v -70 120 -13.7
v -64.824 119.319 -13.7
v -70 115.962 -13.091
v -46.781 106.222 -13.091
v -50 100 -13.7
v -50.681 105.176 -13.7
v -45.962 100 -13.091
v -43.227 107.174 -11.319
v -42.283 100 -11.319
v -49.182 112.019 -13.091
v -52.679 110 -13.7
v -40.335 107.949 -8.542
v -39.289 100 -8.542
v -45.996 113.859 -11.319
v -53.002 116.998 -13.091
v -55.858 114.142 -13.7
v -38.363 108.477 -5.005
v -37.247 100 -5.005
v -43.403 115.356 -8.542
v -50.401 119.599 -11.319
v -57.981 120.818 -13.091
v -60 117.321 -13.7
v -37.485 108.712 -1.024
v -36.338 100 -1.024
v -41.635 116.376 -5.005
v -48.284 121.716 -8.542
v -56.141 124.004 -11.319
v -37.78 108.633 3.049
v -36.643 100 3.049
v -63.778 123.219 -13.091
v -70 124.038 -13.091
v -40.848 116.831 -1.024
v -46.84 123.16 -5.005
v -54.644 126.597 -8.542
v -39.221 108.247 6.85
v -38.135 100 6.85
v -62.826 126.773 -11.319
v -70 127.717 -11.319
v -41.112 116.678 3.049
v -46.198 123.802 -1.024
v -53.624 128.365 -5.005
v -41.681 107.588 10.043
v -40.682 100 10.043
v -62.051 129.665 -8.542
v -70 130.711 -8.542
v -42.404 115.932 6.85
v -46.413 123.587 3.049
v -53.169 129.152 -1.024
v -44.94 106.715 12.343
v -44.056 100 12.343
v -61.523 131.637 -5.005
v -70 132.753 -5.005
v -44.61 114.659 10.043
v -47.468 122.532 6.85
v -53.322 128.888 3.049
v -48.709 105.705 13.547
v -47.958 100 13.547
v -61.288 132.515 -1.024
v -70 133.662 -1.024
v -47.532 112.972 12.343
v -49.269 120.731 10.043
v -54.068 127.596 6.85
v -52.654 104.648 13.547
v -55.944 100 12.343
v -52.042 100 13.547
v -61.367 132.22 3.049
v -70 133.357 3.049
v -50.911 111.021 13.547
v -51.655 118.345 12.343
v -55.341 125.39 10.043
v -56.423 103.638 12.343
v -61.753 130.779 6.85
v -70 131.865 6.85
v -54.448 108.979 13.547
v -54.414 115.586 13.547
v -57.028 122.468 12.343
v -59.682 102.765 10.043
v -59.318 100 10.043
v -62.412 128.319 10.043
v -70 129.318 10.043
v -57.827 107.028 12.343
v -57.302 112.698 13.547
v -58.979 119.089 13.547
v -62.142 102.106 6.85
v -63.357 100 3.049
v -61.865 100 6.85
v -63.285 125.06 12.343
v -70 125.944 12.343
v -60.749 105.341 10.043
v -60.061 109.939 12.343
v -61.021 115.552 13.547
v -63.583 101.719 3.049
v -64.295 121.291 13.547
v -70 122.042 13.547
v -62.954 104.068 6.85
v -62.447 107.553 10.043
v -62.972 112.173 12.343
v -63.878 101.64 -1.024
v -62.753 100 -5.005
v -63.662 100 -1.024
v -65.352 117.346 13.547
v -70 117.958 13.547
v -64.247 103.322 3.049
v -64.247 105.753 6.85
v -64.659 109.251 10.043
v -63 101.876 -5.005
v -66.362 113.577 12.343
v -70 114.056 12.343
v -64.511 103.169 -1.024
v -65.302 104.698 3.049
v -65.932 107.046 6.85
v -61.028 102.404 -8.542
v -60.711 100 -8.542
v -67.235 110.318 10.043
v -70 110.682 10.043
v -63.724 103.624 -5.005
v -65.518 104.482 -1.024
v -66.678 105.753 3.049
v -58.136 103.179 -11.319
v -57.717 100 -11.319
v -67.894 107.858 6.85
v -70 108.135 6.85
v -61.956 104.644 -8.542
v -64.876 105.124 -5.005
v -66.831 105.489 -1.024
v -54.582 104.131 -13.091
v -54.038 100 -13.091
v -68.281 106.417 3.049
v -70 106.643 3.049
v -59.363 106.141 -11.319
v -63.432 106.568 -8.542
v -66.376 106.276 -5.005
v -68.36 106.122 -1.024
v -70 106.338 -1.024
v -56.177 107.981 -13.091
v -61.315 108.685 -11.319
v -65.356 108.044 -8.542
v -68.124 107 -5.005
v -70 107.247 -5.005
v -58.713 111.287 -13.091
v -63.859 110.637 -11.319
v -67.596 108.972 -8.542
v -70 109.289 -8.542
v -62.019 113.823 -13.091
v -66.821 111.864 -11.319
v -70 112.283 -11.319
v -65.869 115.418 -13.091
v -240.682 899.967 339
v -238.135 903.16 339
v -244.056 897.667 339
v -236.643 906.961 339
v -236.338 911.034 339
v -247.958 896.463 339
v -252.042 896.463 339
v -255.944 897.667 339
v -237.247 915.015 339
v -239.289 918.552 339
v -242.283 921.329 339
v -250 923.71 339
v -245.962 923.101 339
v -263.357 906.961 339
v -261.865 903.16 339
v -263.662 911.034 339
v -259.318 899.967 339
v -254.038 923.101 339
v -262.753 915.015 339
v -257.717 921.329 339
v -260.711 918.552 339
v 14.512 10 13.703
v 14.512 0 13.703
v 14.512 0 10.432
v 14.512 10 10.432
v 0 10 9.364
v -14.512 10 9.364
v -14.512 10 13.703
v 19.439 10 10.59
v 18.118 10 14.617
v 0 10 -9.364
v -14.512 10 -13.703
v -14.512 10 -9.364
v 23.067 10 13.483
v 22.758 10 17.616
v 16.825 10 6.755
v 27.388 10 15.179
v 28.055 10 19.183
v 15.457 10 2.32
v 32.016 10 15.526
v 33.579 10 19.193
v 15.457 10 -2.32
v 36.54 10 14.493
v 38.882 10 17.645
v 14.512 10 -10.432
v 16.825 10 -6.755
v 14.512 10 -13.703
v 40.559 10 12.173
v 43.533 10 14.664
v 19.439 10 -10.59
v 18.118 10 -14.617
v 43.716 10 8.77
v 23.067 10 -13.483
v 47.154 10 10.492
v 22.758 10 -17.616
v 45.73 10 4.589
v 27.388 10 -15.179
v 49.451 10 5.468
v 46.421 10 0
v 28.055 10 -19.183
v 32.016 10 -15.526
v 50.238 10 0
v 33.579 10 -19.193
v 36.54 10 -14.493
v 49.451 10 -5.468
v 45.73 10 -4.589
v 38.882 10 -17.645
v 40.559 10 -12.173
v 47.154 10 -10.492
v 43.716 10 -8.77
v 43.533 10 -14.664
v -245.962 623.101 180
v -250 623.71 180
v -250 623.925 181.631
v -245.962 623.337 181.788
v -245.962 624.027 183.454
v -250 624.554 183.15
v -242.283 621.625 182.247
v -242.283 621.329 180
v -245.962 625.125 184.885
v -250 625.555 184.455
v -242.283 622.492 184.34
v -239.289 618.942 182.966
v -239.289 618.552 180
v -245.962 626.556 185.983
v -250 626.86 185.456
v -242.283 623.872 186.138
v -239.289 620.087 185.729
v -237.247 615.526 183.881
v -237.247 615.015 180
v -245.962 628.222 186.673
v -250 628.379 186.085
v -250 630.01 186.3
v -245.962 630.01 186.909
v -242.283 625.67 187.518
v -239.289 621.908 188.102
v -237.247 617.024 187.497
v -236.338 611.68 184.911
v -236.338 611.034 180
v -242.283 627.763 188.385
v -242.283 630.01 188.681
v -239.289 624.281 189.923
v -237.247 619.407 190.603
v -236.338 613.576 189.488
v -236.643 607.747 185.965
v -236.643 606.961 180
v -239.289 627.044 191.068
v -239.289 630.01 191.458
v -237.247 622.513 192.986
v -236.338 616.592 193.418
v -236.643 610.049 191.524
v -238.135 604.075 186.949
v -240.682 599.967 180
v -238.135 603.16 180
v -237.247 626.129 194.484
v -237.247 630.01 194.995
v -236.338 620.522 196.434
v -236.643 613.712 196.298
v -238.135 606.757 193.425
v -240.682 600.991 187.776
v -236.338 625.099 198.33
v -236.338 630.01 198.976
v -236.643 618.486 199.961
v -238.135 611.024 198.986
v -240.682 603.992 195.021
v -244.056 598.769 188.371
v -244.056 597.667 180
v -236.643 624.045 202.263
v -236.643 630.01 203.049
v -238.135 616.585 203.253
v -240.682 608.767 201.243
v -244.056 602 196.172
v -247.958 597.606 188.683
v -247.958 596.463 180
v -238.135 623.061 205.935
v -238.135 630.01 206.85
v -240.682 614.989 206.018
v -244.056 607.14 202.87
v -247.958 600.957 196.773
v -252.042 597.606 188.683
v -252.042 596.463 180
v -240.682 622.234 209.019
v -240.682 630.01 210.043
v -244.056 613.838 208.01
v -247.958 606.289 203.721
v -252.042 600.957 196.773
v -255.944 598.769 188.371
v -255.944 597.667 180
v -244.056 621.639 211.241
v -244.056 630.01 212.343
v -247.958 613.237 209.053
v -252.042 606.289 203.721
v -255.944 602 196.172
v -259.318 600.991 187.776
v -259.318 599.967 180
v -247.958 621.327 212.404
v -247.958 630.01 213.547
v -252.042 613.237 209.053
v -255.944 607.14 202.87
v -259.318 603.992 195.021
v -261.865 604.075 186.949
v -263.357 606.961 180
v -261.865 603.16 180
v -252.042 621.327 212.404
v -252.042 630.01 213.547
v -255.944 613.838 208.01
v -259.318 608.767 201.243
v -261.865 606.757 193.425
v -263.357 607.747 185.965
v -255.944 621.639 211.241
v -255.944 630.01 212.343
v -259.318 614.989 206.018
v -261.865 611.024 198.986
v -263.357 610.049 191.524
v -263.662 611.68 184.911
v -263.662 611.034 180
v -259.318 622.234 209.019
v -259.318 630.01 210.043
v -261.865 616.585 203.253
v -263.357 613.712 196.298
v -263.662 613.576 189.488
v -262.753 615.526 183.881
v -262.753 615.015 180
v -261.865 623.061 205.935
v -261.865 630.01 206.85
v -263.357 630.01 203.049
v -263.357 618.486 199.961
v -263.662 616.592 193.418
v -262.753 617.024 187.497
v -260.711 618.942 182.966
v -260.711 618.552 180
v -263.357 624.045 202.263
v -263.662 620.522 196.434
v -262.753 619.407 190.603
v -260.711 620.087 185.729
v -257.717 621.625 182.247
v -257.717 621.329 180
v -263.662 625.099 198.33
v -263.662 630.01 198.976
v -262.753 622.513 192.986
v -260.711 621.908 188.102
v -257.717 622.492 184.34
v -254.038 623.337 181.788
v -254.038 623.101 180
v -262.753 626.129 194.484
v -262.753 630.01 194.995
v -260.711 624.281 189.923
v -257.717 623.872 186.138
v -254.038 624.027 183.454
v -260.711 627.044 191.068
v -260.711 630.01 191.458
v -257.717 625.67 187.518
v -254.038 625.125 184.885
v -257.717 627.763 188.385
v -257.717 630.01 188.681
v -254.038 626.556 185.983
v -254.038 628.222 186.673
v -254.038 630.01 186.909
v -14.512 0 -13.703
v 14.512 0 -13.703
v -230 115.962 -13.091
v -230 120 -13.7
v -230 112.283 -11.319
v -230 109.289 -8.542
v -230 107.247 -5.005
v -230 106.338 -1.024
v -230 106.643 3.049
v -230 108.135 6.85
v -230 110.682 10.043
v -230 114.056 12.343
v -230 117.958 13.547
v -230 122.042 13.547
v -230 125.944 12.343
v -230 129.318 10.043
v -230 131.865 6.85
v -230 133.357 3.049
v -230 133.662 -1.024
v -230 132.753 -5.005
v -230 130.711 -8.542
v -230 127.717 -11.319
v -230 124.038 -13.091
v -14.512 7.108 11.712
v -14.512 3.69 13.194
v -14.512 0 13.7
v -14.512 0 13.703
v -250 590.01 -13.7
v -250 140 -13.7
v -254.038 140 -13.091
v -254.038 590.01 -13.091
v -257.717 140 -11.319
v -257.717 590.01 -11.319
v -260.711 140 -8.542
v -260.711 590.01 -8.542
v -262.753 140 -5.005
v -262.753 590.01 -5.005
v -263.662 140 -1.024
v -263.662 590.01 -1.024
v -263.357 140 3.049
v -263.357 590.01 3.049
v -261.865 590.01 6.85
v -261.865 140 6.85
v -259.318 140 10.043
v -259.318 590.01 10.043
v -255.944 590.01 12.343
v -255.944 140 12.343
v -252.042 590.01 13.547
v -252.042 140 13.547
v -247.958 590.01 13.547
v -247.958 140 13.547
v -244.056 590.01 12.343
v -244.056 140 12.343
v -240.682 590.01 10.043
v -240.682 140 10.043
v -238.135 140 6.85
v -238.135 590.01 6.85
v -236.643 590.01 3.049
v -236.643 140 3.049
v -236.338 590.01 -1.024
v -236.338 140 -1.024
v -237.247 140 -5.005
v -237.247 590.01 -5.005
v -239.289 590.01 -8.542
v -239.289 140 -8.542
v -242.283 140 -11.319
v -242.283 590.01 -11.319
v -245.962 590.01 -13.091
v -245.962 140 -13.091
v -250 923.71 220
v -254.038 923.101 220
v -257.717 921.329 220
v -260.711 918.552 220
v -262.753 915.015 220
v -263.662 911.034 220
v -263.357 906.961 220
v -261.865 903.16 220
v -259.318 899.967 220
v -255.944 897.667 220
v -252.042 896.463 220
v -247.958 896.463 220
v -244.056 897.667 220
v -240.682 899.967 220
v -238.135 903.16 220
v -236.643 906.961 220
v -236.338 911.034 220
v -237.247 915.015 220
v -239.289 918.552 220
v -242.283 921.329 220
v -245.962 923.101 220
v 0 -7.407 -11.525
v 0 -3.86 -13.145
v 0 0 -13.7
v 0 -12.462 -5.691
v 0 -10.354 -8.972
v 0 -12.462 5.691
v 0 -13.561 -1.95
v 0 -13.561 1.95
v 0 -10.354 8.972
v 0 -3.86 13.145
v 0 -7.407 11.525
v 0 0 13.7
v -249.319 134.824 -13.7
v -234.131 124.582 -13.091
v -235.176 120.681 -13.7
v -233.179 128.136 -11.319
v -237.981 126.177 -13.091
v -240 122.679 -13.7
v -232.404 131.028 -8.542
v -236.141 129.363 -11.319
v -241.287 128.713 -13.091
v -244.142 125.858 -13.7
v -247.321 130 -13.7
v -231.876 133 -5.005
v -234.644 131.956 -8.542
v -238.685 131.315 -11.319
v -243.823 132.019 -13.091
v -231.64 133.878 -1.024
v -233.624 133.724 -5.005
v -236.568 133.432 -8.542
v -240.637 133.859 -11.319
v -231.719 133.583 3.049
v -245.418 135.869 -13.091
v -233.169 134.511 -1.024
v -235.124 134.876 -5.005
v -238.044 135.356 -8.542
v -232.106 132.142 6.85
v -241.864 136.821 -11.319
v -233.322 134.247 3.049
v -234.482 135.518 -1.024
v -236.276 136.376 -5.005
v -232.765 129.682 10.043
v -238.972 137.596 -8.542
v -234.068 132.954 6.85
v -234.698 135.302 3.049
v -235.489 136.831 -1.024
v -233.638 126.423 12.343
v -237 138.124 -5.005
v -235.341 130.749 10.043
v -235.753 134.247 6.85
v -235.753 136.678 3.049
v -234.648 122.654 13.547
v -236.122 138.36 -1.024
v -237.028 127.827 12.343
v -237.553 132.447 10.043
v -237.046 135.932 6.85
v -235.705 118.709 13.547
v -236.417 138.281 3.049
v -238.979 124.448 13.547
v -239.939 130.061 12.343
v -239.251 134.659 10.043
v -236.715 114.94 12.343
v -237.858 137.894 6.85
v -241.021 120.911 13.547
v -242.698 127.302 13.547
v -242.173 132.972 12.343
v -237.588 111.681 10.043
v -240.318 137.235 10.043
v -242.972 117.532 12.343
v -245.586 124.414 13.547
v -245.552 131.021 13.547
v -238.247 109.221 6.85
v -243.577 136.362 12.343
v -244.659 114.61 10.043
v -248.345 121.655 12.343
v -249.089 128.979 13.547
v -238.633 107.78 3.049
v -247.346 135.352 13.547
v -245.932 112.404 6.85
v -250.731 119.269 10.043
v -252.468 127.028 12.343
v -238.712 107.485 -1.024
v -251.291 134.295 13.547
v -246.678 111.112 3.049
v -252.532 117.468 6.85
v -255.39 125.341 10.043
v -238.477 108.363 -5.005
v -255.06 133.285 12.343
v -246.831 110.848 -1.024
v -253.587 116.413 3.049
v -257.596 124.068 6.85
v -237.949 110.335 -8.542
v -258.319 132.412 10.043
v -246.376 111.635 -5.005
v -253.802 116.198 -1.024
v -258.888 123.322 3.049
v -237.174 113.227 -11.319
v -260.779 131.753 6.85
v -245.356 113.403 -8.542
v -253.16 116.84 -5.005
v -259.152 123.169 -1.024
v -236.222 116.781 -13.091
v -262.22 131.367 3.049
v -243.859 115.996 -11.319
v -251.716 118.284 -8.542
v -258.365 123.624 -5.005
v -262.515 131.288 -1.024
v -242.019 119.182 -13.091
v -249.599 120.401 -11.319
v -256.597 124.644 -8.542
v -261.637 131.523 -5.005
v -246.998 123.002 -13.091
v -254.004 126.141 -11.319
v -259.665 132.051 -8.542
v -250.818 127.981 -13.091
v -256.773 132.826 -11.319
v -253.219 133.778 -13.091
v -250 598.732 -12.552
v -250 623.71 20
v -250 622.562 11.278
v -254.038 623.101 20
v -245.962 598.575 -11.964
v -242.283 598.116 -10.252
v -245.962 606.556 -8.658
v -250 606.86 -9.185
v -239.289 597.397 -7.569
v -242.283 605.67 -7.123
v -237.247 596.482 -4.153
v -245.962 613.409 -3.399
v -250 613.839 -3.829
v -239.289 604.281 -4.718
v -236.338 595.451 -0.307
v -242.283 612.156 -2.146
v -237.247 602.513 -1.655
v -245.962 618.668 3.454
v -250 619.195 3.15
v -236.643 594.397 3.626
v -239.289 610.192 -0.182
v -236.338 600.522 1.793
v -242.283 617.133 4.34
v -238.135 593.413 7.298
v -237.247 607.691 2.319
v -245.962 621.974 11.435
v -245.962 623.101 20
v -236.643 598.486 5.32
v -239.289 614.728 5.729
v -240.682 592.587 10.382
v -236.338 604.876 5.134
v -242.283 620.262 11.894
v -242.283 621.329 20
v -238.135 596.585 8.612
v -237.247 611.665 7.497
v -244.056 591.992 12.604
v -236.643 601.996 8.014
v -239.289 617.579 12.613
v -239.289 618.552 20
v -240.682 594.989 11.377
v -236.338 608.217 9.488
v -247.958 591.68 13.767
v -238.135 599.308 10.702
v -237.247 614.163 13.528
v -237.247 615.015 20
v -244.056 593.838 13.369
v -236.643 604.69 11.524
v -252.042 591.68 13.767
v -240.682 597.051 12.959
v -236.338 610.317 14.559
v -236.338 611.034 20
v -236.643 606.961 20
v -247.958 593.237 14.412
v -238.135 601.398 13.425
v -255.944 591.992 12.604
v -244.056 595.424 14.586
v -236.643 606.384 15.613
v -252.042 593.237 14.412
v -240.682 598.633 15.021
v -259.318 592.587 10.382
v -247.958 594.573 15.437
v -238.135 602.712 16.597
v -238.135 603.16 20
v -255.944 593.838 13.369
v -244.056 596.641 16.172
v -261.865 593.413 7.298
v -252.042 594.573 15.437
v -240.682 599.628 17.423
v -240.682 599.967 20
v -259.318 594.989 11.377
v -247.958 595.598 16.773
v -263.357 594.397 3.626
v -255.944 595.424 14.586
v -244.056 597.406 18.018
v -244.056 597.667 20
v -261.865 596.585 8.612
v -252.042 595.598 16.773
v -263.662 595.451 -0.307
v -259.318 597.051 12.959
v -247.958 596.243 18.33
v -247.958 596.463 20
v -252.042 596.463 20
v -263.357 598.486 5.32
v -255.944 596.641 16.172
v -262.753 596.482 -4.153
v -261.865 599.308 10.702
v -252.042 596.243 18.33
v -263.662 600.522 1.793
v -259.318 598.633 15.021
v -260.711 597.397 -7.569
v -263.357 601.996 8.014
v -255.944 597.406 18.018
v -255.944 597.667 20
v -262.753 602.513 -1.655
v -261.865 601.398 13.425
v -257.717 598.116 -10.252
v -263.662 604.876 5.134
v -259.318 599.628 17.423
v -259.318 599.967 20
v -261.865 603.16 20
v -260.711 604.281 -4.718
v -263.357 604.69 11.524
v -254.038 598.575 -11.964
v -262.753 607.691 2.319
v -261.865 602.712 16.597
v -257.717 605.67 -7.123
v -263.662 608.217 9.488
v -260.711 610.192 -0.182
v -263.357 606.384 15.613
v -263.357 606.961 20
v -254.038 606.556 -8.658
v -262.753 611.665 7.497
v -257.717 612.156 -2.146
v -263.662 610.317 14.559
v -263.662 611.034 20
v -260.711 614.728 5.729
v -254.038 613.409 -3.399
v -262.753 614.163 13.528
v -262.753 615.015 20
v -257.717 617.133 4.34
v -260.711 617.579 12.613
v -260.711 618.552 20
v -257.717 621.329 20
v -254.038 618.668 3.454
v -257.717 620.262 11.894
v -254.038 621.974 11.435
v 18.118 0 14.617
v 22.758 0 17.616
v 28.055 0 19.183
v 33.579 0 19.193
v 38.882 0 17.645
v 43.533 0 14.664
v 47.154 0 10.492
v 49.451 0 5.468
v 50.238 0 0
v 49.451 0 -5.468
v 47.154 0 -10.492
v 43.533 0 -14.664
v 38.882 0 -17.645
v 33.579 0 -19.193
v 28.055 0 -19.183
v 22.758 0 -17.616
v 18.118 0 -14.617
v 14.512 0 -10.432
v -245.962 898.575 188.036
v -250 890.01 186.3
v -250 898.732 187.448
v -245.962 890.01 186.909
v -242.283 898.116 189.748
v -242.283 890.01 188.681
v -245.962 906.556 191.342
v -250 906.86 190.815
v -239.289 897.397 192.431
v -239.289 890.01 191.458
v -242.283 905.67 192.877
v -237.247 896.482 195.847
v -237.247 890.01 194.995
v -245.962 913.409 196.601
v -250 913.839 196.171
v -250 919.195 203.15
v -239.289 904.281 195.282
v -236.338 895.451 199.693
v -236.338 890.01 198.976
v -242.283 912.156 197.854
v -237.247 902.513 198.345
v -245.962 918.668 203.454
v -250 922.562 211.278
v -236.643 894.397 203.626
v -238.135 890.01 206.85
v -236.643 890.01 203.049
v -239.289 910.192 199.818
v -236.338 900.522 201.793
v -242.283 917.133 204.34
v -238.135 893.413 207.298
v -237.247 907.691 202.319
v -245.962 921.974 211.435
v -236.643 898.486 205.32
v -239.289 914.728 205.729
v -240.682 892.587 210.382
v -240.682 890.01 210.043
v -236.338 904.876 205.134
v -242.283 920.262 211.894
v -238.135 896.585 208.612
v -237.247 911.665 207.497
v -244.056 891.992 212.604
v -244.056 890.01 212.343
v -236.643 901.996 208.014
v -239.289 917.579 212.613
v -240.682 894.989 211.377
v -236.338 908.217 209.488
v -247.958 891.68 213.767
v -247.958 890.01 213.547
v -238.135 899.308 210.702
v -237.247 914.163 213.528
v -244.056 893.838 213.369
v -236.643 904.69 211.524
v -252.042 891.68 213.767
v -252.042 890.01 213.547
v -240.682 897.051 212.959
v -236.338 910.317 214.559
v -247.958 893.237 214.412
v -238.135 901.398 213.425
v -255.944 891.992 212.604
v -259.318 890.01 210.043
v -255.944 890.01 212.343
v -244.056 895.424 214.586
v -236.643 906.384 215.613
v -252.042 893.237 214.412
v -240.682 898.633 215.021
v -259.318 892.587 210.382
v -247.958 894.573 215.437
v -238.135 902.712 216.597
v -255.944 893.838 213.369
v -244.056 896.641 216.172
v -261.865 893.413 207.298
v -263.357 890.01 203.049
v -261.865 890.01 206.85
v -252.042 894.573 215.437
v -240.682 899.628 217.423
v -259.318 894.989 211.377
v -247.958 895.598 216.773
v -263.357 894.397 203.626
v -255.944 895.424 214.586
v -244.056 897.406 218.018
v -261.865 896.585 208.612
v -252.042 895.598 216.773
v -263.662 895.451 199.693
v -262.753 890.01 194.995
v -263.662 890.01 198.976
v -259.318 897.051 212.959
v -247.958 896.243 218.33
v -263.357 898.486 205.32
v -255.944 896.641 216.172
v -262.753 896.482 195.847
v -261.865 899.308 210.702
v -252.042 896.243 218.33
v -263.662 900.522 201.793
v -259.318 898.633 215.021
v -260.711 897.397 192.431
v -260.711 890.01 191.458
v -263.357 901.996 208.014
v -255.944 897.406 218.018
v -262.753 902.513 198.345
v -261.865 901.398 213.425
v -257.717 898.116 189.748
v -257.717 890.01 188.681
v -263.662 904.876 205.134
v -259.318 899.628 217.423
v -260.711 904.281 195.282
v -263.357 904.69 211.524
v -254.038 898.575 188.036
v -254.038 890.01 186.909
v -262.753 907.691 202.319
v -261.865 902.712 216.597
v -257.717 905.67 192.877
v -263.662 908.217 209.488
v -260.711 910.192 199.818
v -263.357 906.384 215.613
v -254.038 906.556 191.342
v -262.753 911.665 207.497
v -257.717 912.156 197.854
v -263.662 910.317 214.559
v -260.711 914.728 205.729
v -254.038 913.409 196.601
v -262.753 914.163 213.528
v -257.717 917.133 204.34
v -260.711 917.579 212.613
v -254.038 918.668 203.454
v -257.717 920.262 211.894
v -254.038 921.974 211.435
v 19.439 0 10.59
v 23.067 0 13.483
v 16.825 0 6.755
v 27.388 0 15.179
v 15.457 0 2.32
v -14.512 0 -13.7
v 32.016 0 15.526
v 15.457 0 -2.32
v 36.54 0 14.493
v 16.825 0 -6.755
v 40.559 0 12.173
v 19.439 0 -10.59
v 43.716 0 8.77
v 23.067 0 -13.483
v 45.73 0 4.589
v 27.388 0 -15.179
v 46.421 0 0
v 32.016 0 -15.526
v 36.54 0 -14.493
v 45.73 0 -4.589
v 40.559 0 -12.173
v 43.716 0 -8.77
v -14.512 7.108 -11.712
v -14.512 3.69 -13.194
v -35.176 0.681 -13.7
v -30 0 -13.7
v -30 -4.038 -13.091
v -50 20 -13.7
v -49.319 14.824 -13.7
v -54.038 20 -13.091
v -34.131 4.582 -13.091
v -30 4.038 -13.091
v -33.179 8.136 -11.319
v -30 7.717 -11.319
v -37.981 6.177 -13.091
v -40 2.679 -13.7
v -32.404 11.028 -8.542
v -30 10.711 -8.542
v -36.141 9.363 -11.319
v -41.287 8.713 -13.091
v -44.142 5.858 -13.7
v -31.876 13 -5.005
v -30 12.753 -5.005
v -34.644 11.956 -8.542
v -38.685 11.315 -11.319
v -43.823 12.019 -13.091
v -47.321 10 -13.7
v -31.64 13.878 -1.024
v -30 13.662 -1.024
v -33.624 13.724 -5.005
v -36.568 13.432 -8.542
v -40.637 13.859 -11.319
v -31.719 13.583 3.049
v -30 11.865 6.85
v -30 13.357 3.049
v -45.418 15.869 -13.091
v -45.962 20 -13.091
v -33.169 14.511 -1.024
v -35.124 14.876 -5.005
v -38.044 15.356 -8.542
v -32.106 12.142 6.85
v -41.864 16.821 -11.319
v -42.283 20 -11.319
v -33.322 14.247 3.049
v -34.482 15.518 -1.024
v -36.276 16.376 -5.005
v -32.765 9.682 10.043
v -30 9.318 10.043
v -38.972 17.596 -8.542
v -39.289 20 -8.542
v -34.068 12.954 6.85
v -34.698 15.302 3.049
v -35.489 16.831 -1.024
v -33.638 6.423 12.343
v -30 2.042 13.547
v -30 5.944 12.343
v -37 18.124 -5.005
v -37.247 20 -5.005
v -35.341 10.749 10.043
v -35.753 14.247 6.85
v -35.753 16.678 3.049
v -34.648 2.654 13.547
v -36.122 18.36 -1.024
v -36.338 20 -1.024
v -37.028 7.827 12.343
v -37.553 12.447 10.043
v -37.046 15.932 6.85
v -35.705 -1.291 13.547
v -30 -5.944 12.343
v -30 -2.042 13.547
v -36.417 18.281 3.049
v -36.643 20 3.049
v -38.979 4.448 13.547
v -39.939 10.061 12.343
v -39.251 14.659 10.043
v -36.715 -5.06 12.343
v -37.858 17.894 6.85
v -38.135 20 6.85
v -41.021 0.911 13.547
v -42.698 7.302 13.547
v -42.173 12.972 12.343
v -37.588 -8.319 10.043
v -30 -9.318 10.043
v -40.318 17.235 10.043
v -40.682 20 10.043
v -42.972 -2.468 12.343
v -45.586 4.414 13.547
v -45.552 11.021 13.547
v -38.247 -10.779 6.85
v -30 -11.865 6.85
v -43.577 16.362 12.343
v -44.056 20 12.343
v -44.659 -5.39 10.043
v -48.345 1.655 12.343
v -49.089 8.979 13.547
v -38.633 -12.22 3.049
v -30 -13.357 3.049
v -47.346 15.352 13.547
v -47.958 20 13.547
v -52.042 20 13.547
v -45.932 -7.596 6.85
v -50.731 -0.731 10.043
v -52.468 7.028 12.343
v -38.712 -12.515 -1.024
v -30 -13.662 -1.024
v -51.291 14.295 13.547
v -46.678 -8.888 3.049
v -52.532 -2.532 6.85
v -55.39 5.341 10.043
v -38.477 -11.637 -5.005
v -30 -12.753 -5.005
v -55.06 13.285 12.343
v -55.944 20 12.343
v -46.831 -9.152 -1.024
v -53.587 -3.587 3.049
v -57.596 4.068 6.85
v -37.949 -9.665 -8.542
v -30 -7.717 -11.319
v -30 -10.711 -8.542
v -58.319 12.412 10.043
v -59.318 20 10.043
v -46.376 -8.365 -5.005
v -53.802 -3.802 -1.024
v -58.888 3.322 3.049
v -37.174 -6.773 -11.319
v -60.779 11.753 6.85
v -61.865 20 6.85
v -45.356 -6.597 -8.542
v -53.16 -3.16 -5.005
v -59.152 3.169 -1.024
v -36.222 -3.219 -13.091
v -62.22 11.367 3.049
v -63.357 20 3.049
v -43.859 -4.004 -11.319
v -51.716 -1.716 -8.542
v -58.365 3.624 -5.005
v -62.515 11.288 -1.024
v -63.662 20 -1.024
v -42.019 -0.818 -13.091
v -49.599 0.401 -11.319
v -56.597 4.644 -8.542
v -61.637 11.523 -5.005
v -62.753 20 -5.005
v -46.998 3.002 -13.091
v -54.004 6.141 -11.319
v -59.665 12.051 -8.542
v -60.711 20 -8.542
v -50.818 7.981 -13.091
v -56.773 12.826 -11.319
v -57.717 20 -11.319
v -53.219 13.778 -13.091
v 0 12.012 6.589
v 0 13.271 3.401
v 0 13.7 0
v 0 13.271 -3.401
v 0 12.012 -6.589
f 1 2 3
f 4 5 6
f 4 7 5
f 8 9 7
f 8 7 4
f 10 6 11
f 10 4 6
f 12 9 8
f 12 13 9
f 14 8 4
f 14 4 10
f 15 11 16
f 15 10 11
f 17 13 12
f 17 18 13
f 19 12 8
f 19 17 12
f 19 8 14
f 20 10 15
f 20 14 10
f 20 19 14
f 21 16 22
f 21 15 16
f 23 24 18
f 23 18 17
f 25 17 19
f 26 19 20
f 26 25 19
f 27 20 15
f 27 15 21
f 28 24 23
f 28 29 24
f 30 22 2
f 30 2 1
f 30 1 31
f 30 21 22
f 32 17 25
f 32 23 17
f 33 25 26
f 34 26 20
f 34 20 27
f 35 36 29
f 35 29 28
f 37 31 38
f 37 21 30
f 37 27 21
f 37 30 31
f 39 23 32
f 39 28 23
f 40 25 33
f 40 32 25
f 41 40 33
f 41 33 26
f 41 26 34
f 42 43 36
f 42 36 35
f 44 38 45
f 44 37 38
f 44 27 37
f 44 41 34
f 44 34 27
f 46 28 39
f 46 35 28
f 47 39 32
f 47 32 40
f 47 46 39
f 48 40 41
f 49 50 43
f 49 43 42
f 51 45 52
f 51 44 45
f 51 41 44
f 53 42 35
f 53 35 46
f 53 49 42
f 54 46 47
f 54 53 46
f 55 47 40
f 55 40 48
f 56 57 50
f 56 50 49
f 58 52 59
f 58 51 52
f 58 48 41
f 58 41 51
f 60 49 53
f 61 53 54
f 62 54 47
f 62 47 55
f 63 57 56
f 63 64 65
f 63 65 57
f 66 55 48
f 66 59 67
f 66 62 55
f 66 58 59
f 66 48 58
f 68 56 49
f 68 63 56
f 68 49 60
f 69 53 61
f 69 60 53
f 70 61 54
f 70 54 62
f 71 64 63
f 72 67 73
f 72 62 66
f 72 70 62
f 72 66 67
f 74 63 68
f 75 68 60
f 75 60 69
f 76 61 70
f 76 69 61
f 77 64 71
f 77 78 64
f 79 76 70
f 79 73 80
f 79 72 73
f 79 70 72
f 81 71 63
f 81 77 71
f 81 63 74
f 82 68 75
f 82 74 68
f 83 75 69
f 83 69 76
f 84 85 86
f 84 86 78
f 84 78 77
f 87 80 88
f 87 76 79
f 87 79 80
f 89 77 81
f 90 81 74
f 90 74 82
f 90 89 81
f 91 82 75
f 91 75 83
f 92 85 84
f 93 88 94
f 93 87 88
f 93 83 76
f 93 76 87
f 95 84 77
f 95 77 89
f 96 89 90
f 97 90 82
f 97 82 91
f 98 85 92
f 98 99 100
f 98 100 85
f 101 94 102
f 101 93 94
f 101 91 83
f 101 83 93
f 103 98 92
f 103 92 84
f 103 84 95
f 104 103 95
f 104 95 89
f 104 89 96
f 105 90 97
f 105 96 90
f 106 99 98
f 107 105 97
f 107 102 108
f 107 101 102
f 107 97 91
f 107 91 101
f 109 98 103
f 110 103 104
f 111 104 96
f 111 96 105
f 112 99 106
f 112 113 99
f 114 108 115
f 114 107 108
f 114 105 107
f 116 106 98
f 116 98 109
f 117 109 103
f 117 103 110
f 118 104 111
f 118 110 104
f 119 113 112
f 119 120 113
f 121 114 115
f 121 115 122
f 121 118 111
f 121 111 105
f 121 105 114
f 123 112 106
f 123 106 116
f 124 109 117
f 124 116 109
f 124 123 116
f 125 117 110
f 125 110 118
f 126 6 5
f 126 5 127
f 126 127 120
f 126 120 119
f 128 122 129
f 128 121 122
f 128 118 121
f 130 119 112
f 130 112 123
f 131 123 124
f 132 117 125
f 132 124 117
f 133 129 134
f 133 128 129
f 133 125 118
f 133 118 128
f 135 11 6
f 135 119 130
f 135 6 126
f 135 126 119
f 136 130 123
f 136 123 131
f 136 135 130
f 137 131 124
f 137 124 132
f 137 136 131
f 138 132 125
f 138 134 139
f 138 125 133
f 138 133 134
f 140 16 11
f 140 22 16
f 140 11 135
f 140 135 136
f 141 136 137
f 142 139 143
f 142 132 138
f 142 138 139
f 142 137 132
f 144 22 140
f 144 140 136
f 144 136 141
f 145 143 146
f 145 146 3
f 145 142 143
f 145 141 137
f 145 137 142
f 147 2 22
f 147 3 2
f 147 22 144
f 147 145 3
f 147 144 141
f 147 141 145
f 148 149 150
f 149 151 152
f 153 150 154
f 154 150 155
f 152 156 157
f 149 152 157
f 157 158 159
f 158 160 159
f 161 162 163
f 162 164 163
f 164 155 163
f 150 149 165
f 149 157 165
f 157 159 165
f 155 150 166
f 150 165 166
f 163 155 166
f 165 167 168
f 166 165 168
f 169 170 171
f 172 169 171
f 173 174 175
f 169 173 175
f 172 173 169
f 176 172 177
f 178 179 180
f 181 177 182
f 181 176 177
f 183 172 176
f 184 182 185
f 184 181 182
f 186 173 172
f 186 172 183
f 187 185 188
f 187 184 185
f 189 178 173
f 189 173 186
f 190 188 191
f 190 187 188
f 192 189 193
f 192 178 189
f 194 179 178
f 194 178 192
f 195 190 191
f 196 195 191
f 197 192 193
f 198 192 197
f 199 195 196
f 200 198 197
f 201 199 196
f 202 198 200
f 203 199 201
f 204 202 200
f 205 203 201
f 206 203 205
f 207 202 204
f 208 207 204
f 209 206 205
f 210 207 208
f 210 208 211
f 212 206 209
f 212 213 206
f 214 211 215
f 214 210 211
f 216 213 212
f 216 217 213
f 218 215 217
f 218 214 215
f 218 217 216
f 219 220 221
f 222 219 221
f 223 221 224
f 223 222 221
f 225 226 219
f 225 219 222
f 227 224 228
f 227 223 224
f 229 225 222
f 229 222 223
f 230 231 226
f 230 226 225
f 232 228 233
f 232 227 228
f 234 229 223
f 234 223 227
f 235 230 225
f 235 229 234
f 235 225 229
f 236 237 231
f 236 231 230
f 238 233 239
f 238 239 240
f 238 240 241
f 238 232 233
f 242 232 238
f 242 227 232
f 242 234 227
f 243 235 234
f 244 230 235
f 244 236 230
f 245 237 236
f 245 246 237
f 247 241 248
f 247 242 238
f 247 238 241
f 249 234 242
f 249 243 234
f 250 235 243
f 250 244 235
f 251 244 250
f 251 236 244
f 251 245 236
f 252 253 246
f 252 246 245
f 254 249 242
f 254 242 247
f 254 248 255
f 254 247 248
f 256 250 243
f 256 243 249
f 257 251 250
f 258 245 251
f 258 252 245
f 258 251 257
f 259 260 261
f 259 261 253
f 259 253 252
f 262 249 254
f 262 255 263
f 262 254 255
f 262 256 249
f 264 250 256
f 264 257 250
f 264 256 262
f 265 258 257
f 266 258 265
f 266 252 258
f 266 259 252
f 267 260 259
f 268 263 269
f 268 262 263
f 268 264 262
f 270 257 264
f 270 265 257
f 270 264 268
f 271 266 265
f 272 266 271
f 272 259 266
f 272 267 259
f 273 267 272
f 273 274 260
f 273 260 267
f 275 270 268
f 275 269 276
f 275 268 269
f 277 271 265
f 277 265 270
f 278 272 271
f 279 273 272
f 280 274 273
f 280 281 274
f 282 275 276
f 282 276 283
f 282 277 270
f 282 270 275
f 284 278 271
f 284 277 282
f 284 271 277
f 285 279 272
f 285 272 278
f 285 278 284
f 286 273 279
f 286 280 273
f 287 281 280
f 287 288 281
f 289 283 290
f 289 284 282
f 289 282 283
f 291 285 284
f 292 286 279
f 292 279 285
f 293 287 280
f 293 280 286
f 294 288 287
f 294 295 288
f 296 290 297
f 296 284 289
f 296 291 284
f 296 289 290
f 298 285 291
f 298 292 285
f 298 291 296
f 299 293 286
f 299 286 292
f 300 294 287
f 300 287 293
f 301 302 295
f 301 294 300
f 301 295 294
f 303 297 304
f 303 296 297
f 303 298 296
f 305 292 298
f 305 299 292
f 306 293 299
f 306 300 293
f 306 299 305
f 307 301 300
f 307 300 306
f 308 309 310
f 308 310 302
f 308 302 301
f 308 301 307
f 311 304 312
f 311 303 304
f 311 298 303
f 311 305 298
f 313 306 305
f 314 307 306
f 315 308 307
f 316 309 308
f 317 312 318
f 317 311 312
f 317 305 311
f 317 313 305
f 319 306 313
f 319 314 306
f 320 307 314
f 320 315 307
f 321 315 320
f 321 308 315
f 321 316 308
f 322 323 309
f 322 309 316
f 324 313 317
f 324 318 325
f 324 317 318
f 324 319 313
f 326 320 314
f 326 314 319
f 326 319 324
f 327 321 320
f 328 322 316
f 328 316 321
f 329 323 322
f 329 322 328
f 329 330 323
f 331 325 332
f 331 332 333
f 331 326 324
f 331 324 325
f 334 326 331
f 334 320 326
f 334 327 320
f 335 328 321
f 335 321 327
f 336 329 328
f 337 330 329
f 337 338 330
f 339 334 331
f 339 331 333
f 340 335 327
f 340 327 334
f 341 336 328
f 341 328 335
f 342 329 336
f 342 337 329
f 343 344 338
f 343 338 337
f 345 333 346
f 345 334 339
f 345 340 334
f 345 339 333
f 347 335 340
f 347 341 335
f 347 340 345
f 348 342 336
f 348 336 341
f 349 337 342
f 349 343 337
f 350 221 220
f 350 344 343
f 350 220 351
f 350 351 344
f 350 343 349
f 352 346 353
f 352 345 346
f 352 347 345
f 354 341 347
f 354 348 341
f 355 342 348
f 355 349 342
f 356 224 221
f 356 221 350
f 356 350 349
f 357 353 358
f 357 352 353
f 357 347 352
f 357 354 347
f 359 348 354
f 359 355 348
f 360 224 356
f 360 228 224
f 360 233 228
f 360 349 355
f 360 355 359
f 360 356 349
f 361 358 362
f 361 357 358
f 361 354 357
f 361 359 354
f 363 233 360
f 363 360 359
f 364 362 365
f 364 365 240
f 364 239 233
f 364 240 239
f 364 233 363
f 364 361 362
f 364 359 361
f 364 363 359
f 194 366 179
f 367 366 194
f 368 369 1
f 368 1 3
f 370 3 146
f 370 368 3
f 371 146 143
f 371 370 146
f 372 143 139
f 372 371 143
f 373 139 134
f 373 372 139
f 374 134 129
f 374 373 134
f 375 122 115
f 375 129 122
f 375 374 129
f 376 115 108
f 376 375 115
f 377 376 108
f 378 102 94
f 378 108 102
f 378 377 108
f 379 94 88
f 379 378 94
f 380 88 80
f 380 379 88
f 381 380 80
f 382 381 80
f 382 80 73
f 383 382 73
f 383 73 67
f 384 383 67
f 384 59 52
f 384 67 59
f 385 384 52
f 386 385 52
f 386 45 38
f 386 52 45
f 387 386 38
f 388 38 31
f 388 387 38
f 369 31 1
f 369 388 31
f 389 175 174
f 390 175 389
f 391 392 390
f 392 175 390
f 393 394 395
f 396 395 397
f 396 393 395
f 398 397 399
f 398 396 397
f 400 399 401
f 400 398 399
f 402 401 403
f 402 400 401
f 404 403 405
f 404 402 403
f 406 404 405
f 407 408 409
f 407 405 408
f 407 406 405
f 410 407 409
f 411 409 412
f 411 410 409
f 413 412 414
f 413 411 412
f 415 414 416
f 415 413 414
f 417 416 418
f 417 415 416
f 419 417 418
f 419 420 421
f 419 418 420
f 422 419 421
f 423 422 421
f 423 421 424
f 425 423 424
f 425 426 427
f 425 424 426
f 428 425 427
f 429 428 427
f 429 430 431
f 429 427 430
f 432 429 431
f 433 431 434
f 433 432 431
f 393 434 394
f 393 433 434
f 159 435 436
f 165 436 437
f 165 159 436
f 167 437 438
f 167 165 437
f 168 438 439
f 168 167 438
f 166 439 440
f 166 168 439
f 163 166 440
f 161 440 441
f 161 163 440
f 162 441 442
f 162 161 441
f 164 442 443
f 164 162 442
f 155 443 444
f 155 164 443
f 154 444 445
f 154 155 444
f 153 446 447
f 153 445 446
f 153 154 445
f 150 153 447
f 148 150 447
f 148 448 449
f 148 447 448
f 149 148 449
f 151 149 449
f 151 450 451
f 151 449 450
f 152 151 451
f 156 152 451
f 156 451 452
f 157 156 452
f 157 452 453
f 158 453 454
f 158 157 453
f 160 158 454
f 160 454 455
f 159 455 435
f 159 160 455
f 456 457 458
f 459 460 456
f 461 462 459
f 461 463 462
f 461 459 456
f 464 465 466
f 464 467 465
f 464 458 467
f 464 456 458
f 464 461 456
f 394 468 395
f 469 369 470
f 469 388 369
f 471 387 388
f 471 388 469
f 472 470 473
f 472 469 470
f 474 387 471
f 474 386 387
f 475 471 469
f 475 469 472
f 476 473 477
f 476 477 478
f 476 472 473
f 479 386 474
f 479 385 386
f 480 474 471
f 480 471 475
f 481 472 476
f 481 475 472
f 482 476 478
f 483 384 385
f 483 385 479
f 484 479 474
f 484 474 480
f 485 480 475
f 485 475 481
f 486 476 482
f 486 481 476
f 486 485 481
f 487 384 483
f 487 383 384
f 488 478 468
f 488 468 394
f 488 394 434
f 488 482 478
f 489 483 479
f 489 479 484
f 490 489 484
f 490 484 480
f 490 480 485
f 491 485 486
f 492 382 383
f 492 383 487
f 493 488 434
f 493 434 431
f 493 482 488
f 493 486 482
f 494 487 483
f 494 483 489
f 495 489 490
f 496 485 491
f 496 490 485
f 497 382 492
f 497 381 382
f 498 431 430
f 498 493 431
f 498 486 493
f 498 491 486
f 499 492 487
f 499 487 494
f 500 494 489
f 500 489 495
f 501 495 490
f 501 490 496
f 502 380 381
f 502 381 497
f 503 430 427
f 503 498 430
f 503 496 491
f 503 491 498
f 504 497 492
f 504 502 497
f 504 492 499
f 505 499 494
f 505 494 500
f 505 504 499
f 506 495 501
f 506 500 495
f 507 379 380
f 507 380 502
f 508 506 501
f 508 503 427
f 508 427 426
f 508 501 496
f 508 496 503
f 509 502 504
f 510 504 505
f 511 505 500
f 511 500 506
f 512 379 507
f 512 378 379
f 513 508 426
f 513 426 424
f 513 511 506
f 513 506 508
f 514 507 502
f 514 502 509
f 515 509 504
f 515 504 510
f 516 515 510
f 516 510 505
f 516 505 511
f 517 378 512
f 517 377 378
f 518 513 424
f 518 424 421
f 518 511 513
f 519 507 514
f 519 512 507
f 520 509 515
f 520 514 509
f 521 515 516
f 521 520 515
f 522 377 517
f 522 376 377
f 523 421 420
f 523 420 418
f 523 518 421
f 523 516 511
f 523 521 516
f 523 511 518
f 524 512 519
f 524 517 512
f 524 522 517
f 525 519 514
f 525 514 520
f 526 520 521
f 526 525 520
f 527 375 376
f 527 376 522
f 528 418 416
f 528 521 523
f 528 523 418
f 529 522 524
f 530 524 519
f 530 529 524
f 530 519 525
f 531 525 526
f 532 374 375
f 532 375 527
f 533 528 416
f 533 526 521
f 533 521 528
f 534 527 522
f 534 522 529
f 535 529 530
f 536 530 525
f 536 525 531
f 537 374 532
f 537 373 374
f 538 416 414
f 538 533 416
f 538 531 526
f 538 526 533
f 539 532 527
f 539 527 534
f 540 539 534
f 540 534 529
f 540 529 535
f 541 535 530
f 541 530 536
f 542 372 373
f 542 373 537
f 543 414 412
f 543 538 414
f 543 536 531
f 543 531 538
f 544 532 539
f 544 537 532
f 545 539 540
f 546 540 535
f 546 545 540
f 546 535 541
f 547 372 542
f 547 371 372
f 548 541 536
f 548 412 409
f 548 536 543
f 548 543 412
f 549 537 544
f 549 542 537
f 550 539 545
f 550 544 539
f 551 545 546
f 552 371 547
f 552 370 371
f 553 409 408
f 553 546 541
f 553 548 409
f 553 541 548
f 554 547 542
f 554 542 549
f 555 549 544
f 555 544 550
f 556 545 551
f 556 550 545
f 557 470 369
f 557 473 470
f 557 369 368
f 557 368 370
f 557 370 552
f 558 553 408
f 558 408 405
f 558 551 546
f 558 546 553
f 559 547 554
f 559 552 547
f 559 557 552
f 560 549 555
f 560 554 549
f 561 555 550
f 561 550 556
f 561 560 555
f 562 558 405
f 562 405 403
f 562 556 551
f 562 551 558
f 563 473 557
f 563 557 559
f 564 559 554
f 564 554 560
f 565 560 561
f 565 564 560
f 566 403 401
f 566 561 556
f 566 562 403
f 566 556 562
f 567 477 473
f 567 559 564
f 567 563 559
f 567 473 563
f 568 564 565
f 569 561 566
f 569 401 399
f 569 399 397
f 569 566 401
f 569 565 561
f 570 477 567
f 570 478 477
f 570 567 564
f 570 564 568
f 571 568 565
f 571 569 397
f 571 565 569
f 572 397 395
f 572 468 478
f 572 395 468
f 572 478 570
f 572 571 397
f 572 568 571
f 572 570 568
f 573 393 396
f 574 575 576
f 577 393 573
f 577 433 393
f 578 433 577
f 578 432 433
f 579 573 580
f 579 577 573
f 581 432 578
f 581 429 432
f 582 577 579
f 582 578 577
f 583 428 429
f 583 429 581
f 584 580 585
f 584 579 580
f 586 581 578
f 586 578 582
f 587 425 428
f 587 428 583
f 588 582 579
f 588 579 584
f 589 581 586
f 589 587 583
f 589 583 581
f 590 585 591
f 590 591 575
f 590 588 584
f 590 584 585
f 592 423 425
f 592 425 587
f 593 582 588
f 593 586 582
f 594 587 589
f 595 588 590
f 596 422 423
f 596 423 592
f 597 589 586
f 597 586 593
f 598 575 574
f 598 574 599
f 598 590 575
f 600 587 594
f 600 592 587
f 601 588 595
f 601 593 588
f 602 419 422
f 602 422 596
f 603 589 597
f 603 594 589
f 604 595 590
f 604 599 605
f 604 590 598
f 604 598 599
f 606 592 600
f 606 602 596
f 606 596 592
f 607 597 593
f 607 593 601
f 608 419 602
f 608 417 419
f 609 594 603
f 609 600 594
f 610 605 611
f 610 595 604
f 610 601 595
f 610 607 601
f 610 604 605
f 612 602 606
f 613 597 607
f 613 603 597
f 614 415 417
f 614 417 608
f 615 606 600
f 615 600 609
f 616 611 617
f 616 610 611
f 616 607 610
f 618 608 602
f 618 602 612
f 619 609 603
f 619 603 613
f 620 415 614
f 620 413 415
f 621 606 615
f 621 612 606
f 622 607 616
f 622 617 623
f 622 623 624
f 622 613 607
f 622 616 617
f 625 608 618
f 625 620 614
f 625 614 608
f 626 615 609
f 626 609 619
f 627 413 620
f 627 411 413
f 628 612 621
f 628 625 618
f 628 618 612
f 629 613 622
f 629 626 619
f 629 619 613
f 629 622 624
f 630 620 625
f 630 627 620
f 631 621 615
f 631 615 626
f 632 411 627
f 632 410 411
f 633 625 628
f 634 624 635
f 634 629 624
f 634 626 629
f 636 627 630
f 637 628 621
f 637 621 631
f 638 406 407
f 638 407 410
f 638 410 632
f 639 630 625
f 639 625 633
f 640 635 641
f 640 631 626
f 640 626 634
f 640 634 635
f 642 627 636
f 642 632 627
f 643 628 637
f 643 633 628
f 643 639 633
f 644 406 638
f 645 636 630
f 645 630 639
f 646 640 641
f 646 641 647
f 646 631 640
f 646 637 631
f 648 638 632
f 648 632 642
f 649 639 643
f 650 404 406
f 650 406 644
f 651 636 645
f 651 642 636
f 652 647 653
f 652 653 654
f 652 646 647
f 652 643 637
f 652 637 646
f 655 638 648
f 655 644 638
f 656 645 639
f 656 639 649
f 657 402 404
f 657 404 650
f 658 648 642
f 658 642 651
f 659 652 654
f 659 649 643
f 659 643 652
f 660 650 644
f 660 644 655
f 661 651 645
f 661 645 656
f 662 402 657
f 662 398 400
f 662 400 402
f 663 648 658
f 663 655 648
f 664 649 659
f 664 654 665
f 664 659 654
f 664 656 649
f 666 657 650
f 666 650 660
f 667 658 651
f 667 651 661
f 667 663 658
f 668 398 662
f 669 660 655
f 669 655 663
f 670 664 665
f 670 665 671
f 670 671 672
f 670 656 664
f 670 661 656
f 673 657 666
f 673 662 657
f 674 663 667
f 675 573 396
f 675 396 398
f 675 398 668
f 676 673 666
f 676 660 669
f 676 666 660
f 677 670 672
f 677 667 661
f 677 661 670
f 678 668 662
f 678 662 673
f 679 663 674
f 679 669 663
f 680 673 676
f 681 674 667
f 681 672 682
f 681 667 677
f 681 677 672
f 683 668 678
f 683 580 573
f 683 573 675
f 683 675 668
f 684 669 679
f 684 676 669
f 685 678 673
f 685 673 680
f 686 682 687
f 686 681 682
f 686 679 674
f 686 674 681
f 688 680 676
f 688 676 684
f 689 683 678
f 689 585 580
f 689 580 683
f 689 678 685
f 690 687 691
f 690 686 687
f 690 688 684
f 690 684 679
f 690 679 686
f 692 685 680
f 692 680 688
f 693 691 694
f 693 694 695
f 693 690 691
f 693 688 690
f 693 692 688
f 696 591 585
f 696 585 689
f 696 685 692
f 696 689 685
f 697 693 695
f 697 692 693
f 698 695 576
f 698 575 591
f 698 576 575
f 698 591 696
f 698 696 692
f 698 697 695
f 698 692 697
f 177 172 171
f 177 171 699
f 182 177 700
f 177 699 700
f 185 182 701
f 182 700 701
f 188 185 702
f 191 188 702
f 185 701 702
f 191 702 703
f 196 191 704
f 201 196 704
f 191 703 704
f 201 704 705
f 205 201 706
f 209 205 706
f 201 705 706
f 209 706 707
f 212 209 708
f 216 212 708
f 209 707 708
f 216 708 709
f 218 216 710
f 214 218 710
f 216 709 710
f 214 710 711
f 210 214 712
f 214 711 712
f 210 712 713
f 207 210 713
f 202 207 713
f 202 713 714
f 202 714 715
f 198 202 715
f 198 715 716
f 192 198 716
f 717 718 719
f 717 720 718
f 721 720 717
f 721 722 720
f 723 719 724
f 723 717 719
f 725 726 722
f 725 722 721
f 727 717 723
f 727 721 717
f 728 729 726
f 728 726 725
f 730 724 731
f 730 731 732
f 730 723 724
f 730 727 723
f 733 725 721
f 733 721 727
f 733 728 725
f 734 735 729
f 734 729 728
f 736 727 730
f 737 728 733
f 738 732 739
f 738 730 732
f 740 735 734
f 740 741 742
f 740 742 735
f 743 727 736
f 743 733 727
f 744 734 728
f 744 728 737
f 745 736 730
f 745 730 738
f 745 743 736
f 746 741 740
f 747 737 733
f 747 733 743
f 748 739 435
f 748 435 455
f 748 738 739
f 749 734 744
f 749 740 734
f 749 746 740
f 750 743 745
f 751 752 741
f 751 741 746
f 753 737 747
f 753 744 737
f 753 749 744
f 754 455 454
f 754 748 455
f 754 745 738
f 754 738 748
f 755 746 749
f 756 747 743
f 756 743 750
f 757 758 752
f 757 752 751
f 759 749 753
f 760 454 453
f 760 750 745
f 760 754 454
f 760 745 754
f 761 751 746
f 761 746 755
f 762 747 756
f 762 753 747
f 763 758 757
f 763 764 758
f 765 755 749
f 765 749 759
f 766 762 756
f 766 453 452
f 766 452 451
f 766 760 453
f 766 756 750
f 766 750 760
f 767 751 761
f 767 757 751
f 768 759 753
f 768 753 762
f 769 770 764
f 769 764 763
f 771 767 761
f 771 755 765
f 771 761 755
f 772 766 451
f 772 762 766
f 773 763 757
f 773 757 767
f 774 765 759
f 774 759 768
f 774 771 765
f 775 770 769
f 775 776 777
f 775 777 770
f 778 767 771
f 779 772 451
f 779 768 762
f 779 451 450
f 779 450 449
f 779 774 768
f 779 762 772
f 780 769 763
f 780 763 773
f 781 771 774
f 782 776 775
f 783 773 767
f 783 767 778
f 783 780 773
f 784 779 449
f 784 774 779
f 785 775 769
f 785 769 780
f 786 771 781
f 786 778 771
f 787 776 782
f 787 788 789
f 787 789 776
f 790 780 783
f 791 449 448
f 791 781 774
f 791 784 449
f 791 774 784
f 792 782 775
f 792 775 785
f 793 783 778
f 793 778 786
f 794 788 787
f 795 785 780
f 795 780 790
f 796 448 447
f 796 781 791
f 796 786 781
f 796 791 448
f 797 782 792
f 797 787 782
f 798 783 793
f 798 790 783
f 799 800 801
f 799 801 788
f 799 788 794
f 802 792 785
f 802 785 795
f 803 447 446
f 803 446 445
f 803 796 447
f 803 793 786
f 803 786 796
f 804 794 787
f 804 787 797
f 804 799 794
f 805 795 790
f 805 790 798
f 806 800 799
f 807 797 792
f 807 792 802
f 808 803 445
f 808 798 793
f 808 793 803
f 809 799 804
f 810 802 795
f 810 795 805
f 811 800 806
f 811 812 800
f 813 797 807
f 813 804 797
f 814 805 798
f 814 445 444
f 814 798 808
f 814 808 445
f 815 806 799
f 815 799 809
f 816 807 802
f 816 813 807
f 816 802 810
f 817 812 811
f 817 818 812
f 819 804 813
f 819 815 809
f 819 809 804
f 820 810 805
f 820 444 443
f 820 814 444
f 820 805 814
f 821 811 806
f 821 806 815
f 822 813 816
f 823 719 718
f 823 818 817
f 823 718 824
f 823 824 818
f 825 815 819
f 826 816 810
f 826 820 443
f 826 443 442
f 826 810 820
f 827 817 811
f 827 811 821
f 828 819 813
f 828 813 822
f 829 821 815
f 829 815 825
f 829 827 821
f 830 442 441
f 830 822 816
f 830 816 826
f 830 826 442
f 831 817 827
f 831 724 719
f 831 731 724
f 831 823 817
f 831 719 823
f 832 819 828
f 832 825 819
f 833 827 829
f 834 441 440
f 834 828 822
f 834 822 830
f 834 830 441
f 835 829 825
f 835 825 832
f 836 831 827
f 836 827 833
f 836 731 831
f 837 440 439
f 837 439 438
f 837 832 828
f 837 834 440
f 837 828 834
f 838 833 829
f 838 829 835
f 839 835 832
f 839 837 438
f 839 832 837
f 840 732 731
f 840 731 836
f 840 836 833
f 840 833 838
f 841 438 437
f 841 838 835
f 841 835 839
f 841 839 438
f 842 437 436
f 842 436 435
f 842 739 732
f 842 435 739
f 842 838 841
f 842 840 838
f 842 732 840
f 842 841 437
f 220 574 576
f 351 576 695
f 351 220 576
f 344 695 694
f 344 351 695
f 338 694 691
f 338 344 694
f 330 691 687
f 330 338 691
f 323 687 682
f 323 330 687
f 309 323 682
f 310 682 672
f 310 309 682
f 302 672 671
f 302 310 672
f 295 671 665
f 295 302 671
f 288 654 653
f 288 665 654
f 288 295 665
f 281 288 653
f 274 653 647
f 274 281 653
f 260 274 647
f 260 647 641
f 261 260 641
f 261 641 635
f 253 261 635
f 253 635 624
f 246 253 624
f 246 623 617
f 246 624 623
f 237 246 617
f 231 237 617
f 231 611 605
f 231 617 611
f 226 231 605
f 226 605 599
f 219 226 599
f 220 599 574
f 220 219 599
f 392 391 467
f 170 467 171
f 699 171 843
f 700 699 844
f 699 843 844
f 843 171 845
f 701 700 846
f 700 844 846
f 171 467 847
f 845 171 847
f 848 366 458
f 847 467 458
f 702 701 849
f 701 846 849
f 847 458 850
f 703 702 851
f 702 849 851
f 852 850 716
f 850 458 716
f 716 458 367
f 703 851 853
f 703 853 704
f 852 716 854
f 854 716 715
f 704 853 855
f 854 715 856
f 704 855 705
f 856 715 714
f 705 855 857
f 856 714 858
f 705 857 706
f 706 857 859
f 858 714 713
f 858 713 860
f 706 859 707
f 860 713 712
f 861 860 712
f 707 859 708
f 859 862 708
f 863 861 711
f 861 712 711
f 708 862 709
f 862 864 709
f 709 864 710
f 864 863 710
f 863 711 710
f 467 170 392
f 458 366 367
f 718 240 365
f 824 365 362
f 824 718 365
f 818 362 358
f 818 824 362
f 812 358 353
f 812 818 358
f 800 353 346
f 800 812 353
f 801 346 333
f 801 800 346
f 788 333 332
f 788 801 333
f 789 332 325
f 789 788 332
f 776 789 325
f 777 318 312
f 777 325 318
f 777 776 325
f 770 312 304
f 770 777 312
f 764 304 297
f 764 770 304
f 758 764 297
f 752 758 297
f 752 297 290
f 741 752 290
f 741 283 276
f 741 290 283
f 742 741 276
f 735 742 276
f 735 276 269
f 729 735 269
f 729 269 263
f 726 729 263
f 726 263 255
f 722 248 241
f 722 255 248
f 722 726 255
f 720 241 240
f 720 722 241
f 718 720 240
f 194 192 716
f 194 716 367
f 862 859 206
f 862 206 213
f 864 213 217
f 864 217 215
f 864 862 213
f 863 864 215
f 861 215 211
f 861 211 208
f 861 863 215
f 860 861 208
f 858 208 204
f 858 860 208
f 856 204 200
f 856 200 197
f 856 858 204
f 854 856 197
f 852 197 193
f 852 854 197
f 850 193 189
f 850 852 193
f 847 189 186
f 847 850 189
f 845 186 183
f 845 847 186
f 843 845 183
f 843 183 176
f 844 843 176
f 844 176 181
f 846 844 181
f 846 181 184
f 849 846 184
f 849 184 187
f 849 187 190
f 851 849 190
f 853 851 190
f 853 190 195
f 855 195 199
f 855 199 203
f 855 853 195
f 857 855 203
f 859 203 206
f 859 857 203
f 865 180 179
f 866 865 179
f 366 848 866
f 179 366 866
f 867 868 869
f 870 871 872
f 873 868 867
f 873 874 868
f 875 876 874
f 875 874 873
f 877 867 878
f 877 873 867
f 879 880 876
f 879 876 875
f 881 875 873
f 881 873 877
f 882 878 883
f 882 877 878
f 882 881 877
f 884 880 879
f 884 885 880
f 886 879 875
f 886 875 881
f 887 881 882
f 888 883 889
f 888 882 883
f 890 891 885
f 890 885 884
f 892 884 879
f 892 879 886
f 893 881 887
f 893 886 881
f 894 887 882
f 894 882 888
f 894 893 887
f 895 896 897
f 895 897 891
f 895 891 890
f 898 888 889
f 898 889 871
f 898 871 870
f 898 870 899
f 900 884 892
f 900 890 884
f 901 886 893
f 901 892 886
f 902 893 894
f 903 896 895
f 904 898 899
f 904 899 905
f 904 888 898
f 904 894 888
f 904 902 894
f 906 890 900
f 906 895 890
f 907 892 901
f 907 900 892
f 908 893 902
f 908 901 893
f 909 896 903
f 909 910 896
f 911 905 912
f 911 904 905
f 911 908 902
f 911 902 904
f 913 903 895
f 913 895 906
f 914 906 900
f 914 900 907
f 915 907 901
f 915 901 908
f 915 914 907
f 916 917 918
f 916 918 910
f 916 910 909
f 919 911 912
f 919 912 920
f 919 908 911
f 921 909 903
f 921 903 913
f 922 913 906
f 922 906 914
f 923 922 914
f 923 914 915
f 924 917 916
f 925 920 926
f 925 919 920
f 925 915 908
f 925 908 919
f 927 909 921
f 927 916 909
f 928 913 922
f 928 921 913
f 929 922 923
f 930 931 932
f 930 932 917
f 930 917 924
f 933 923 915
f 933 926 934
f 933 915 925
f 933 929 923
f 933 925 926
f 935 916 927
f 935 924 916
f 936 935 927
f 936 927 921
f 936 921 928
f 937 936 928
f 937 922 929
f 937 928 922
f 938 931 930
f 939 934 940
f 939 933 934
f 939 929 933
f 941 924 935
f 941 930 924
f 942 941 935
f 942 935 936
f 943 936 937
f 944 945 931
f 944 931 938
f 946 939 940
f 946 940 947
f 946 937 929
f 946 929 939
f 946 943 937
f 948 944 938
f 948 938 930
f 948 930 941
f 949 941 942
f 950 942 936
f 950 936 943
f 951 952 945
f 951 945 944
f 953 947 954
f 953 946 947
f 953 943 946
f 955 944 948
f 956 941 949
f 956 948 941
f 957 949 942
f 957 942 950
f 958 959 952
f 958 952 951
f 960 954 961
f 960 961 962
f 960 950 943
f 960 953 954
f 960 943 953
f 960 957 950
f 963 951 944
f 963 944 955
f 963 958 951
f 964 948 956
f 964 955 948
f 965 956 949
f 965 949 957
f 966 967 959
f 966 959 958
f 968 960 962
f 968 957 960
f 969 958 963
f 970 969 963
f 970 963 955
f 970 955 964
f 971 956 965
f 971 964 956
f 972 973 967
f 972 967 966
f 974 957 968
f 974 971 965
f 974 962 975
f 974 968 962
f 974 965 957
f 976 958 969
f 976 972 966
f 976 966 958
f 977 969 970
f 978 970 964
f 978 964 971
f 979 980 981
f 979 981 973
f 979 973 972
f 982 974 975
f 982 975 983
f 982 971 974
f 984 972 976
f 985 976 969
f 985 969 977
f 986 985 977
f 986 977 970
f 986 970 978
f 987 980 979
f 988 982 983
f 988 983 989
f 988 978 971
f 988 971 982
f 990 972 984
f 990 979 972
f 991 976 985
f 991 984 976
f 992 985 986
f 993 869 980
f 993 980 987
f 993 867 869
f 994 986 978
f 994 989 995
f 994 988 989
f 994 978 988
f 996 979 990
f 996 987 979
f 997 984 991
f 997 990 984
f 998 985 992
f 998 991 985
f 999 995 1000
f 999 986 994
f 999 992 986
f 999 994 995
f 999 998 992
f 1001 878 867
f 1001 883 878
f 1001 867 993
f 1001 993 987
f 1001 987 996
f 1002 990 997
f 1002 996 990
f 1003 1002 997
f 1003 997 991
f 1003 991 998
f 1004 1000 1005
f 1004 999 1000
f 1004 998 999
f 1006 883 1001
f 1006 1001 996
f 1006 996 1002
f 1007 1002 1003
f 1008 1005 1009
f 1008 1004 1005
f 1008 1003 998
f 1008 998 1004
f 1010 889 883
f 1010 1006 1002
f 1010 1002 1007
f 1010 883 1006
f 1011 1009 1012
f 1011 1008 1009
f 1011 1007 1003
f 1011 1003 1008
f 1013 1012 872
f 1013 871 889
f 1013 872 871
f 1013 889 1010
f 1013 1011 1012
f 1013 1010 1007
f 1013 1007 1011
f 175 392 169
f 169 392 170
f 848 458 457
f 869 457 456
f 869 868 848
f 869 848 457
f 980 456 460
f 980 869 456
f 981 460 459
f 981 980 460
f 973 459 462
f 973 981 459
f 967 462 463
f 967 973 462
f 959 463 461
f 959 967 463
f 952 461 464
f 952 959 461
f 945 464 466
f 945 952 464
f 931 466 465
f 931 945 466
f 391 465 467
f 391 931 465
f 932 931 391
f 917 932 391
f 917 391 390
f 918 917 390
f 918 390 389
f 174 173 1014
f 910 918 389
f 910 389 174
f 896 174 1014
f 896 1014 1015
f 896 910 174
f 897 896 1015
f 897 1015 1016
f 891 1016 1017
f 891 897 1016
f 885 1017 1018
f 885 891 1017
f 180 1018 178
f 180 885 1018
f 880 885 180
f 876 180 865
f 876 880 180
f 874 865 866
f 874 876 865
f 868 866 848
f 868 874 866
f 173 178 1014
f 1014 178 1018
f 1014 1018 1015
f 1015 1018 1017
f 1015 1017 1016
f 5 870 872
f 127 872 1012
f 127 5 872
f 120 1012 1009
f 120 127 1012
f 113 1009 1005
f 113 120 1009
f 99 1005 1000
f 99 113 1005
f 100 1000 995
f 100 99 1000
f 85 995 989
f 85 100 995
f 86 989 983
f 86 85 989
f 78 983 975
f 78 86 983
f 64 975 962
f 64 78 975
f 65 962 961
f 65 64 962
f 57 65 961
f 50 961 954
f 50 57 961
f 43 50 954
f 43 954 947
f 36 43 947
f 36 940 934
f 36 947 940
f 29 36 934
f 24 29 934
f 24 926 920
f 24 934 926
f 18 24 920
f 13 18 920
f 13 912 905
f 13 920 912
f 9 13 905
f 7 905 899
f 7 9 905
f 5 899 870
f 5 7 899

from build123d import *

# Parameters (mm, degrees)
CROQUIS1_R              = 13.7
CROQUIS2_R              = 19.386232946
CROQUIS2_R_2            = 15.569283249
SALIENTE_EXTRUIR1_DEPTH = 10
CROQUIS3_W              = 29.024267222
CROQUIS3_H              = 27.405549086
SALIENTE_EXTRUIR2_DEPTH = 10


with BuildPart() as part:
    # Barrer1: sweep along a curve in space
    with BuildLine() as barrer1_path:
        Line((0, 0, 0), (-30, 0, 0))
        ThreePointArc((-30, 0, 0), (-44.142135624, 5.857864376, 0), (-50, 20, 0))
        Line((-50, 20, 0), (-50, 100, 0))
        ThreePointArc((-50, 100, 0), (-55.857864376, 114.142135624, 0), (-70, 120, 0))
        Line((-70, 120, 0), (-230, 120, 0))
        ThreePointArc((-230, 120, 0), (-244.142135624, 125.857864376, 0), (-250, 140, 0))
        Line((-250, 140, 0), (-250, 590.01, 0))
        ThreePointArc((-250, 590.01, 0), (-250, 604.152135624, 5.857864376), (-250, 610.01, 20))
        Line((-250, 610.01, 20), (-250, 610.01, 180))
        ThreePointArc((-250, 610.01, 180), (-250, 615.867864376, 194.142135624), (-250, 630.01, 200))
        Line((-250, 630.01, 200), (-250, 890.01, 200))
        ThreePointArc((-250, 890.01, 200), (-250, 904.152135624, 205.857864376), (-250, 910.01, 220))
        Line((-250, 910.01, 220), (-250, 910.01, 339))
    # Croquis1 → Barrer1 (sweep)
    with BuildSketch(Plane(origin=(0, 0, 0), x_dir=(0, 0, -1), z_dir=(1, 0, 0))):
        Circle(CROQUIS1_R)
    sweep(path=barrer1_path.line)



with BuildPart() as body_2:
    # Croquis2 → Saliente-Extruir1 (new body)
    with BuildSketch(Plane(origin=(0, 0, 0), x_dir=(1, 0, 0), z_dir=(0, 1, 0))):
        with Locations((30.852076519, 0)):
            Circle(CROQUIS2_R)
        with Locations((30.852076519, 0)):
            Circle(CROQUIS2_R_2, mode=Mode.SUBTRACT)
    extrude(amount=SALIENTE_EXTRUIR1_DEPTH)


with BuildPart() as part_1:
    add(part.part)

    add(body_2.part)  # Saliente-Extruir2 merges body 2
    # Croquis3 → Saliente-Extruir2 (add)
    with BuildSketch(Plane(origin=(0, 0, 0), x_dir=(1, 0, 0), z_dir=(0, 1, 0))):
        Rectangle(CROQUIS3_W, CROQUIS3_H)
    extrude(amount=SALIENTE_EXTRUIR2_DEPTH)


solid = part_1.part
